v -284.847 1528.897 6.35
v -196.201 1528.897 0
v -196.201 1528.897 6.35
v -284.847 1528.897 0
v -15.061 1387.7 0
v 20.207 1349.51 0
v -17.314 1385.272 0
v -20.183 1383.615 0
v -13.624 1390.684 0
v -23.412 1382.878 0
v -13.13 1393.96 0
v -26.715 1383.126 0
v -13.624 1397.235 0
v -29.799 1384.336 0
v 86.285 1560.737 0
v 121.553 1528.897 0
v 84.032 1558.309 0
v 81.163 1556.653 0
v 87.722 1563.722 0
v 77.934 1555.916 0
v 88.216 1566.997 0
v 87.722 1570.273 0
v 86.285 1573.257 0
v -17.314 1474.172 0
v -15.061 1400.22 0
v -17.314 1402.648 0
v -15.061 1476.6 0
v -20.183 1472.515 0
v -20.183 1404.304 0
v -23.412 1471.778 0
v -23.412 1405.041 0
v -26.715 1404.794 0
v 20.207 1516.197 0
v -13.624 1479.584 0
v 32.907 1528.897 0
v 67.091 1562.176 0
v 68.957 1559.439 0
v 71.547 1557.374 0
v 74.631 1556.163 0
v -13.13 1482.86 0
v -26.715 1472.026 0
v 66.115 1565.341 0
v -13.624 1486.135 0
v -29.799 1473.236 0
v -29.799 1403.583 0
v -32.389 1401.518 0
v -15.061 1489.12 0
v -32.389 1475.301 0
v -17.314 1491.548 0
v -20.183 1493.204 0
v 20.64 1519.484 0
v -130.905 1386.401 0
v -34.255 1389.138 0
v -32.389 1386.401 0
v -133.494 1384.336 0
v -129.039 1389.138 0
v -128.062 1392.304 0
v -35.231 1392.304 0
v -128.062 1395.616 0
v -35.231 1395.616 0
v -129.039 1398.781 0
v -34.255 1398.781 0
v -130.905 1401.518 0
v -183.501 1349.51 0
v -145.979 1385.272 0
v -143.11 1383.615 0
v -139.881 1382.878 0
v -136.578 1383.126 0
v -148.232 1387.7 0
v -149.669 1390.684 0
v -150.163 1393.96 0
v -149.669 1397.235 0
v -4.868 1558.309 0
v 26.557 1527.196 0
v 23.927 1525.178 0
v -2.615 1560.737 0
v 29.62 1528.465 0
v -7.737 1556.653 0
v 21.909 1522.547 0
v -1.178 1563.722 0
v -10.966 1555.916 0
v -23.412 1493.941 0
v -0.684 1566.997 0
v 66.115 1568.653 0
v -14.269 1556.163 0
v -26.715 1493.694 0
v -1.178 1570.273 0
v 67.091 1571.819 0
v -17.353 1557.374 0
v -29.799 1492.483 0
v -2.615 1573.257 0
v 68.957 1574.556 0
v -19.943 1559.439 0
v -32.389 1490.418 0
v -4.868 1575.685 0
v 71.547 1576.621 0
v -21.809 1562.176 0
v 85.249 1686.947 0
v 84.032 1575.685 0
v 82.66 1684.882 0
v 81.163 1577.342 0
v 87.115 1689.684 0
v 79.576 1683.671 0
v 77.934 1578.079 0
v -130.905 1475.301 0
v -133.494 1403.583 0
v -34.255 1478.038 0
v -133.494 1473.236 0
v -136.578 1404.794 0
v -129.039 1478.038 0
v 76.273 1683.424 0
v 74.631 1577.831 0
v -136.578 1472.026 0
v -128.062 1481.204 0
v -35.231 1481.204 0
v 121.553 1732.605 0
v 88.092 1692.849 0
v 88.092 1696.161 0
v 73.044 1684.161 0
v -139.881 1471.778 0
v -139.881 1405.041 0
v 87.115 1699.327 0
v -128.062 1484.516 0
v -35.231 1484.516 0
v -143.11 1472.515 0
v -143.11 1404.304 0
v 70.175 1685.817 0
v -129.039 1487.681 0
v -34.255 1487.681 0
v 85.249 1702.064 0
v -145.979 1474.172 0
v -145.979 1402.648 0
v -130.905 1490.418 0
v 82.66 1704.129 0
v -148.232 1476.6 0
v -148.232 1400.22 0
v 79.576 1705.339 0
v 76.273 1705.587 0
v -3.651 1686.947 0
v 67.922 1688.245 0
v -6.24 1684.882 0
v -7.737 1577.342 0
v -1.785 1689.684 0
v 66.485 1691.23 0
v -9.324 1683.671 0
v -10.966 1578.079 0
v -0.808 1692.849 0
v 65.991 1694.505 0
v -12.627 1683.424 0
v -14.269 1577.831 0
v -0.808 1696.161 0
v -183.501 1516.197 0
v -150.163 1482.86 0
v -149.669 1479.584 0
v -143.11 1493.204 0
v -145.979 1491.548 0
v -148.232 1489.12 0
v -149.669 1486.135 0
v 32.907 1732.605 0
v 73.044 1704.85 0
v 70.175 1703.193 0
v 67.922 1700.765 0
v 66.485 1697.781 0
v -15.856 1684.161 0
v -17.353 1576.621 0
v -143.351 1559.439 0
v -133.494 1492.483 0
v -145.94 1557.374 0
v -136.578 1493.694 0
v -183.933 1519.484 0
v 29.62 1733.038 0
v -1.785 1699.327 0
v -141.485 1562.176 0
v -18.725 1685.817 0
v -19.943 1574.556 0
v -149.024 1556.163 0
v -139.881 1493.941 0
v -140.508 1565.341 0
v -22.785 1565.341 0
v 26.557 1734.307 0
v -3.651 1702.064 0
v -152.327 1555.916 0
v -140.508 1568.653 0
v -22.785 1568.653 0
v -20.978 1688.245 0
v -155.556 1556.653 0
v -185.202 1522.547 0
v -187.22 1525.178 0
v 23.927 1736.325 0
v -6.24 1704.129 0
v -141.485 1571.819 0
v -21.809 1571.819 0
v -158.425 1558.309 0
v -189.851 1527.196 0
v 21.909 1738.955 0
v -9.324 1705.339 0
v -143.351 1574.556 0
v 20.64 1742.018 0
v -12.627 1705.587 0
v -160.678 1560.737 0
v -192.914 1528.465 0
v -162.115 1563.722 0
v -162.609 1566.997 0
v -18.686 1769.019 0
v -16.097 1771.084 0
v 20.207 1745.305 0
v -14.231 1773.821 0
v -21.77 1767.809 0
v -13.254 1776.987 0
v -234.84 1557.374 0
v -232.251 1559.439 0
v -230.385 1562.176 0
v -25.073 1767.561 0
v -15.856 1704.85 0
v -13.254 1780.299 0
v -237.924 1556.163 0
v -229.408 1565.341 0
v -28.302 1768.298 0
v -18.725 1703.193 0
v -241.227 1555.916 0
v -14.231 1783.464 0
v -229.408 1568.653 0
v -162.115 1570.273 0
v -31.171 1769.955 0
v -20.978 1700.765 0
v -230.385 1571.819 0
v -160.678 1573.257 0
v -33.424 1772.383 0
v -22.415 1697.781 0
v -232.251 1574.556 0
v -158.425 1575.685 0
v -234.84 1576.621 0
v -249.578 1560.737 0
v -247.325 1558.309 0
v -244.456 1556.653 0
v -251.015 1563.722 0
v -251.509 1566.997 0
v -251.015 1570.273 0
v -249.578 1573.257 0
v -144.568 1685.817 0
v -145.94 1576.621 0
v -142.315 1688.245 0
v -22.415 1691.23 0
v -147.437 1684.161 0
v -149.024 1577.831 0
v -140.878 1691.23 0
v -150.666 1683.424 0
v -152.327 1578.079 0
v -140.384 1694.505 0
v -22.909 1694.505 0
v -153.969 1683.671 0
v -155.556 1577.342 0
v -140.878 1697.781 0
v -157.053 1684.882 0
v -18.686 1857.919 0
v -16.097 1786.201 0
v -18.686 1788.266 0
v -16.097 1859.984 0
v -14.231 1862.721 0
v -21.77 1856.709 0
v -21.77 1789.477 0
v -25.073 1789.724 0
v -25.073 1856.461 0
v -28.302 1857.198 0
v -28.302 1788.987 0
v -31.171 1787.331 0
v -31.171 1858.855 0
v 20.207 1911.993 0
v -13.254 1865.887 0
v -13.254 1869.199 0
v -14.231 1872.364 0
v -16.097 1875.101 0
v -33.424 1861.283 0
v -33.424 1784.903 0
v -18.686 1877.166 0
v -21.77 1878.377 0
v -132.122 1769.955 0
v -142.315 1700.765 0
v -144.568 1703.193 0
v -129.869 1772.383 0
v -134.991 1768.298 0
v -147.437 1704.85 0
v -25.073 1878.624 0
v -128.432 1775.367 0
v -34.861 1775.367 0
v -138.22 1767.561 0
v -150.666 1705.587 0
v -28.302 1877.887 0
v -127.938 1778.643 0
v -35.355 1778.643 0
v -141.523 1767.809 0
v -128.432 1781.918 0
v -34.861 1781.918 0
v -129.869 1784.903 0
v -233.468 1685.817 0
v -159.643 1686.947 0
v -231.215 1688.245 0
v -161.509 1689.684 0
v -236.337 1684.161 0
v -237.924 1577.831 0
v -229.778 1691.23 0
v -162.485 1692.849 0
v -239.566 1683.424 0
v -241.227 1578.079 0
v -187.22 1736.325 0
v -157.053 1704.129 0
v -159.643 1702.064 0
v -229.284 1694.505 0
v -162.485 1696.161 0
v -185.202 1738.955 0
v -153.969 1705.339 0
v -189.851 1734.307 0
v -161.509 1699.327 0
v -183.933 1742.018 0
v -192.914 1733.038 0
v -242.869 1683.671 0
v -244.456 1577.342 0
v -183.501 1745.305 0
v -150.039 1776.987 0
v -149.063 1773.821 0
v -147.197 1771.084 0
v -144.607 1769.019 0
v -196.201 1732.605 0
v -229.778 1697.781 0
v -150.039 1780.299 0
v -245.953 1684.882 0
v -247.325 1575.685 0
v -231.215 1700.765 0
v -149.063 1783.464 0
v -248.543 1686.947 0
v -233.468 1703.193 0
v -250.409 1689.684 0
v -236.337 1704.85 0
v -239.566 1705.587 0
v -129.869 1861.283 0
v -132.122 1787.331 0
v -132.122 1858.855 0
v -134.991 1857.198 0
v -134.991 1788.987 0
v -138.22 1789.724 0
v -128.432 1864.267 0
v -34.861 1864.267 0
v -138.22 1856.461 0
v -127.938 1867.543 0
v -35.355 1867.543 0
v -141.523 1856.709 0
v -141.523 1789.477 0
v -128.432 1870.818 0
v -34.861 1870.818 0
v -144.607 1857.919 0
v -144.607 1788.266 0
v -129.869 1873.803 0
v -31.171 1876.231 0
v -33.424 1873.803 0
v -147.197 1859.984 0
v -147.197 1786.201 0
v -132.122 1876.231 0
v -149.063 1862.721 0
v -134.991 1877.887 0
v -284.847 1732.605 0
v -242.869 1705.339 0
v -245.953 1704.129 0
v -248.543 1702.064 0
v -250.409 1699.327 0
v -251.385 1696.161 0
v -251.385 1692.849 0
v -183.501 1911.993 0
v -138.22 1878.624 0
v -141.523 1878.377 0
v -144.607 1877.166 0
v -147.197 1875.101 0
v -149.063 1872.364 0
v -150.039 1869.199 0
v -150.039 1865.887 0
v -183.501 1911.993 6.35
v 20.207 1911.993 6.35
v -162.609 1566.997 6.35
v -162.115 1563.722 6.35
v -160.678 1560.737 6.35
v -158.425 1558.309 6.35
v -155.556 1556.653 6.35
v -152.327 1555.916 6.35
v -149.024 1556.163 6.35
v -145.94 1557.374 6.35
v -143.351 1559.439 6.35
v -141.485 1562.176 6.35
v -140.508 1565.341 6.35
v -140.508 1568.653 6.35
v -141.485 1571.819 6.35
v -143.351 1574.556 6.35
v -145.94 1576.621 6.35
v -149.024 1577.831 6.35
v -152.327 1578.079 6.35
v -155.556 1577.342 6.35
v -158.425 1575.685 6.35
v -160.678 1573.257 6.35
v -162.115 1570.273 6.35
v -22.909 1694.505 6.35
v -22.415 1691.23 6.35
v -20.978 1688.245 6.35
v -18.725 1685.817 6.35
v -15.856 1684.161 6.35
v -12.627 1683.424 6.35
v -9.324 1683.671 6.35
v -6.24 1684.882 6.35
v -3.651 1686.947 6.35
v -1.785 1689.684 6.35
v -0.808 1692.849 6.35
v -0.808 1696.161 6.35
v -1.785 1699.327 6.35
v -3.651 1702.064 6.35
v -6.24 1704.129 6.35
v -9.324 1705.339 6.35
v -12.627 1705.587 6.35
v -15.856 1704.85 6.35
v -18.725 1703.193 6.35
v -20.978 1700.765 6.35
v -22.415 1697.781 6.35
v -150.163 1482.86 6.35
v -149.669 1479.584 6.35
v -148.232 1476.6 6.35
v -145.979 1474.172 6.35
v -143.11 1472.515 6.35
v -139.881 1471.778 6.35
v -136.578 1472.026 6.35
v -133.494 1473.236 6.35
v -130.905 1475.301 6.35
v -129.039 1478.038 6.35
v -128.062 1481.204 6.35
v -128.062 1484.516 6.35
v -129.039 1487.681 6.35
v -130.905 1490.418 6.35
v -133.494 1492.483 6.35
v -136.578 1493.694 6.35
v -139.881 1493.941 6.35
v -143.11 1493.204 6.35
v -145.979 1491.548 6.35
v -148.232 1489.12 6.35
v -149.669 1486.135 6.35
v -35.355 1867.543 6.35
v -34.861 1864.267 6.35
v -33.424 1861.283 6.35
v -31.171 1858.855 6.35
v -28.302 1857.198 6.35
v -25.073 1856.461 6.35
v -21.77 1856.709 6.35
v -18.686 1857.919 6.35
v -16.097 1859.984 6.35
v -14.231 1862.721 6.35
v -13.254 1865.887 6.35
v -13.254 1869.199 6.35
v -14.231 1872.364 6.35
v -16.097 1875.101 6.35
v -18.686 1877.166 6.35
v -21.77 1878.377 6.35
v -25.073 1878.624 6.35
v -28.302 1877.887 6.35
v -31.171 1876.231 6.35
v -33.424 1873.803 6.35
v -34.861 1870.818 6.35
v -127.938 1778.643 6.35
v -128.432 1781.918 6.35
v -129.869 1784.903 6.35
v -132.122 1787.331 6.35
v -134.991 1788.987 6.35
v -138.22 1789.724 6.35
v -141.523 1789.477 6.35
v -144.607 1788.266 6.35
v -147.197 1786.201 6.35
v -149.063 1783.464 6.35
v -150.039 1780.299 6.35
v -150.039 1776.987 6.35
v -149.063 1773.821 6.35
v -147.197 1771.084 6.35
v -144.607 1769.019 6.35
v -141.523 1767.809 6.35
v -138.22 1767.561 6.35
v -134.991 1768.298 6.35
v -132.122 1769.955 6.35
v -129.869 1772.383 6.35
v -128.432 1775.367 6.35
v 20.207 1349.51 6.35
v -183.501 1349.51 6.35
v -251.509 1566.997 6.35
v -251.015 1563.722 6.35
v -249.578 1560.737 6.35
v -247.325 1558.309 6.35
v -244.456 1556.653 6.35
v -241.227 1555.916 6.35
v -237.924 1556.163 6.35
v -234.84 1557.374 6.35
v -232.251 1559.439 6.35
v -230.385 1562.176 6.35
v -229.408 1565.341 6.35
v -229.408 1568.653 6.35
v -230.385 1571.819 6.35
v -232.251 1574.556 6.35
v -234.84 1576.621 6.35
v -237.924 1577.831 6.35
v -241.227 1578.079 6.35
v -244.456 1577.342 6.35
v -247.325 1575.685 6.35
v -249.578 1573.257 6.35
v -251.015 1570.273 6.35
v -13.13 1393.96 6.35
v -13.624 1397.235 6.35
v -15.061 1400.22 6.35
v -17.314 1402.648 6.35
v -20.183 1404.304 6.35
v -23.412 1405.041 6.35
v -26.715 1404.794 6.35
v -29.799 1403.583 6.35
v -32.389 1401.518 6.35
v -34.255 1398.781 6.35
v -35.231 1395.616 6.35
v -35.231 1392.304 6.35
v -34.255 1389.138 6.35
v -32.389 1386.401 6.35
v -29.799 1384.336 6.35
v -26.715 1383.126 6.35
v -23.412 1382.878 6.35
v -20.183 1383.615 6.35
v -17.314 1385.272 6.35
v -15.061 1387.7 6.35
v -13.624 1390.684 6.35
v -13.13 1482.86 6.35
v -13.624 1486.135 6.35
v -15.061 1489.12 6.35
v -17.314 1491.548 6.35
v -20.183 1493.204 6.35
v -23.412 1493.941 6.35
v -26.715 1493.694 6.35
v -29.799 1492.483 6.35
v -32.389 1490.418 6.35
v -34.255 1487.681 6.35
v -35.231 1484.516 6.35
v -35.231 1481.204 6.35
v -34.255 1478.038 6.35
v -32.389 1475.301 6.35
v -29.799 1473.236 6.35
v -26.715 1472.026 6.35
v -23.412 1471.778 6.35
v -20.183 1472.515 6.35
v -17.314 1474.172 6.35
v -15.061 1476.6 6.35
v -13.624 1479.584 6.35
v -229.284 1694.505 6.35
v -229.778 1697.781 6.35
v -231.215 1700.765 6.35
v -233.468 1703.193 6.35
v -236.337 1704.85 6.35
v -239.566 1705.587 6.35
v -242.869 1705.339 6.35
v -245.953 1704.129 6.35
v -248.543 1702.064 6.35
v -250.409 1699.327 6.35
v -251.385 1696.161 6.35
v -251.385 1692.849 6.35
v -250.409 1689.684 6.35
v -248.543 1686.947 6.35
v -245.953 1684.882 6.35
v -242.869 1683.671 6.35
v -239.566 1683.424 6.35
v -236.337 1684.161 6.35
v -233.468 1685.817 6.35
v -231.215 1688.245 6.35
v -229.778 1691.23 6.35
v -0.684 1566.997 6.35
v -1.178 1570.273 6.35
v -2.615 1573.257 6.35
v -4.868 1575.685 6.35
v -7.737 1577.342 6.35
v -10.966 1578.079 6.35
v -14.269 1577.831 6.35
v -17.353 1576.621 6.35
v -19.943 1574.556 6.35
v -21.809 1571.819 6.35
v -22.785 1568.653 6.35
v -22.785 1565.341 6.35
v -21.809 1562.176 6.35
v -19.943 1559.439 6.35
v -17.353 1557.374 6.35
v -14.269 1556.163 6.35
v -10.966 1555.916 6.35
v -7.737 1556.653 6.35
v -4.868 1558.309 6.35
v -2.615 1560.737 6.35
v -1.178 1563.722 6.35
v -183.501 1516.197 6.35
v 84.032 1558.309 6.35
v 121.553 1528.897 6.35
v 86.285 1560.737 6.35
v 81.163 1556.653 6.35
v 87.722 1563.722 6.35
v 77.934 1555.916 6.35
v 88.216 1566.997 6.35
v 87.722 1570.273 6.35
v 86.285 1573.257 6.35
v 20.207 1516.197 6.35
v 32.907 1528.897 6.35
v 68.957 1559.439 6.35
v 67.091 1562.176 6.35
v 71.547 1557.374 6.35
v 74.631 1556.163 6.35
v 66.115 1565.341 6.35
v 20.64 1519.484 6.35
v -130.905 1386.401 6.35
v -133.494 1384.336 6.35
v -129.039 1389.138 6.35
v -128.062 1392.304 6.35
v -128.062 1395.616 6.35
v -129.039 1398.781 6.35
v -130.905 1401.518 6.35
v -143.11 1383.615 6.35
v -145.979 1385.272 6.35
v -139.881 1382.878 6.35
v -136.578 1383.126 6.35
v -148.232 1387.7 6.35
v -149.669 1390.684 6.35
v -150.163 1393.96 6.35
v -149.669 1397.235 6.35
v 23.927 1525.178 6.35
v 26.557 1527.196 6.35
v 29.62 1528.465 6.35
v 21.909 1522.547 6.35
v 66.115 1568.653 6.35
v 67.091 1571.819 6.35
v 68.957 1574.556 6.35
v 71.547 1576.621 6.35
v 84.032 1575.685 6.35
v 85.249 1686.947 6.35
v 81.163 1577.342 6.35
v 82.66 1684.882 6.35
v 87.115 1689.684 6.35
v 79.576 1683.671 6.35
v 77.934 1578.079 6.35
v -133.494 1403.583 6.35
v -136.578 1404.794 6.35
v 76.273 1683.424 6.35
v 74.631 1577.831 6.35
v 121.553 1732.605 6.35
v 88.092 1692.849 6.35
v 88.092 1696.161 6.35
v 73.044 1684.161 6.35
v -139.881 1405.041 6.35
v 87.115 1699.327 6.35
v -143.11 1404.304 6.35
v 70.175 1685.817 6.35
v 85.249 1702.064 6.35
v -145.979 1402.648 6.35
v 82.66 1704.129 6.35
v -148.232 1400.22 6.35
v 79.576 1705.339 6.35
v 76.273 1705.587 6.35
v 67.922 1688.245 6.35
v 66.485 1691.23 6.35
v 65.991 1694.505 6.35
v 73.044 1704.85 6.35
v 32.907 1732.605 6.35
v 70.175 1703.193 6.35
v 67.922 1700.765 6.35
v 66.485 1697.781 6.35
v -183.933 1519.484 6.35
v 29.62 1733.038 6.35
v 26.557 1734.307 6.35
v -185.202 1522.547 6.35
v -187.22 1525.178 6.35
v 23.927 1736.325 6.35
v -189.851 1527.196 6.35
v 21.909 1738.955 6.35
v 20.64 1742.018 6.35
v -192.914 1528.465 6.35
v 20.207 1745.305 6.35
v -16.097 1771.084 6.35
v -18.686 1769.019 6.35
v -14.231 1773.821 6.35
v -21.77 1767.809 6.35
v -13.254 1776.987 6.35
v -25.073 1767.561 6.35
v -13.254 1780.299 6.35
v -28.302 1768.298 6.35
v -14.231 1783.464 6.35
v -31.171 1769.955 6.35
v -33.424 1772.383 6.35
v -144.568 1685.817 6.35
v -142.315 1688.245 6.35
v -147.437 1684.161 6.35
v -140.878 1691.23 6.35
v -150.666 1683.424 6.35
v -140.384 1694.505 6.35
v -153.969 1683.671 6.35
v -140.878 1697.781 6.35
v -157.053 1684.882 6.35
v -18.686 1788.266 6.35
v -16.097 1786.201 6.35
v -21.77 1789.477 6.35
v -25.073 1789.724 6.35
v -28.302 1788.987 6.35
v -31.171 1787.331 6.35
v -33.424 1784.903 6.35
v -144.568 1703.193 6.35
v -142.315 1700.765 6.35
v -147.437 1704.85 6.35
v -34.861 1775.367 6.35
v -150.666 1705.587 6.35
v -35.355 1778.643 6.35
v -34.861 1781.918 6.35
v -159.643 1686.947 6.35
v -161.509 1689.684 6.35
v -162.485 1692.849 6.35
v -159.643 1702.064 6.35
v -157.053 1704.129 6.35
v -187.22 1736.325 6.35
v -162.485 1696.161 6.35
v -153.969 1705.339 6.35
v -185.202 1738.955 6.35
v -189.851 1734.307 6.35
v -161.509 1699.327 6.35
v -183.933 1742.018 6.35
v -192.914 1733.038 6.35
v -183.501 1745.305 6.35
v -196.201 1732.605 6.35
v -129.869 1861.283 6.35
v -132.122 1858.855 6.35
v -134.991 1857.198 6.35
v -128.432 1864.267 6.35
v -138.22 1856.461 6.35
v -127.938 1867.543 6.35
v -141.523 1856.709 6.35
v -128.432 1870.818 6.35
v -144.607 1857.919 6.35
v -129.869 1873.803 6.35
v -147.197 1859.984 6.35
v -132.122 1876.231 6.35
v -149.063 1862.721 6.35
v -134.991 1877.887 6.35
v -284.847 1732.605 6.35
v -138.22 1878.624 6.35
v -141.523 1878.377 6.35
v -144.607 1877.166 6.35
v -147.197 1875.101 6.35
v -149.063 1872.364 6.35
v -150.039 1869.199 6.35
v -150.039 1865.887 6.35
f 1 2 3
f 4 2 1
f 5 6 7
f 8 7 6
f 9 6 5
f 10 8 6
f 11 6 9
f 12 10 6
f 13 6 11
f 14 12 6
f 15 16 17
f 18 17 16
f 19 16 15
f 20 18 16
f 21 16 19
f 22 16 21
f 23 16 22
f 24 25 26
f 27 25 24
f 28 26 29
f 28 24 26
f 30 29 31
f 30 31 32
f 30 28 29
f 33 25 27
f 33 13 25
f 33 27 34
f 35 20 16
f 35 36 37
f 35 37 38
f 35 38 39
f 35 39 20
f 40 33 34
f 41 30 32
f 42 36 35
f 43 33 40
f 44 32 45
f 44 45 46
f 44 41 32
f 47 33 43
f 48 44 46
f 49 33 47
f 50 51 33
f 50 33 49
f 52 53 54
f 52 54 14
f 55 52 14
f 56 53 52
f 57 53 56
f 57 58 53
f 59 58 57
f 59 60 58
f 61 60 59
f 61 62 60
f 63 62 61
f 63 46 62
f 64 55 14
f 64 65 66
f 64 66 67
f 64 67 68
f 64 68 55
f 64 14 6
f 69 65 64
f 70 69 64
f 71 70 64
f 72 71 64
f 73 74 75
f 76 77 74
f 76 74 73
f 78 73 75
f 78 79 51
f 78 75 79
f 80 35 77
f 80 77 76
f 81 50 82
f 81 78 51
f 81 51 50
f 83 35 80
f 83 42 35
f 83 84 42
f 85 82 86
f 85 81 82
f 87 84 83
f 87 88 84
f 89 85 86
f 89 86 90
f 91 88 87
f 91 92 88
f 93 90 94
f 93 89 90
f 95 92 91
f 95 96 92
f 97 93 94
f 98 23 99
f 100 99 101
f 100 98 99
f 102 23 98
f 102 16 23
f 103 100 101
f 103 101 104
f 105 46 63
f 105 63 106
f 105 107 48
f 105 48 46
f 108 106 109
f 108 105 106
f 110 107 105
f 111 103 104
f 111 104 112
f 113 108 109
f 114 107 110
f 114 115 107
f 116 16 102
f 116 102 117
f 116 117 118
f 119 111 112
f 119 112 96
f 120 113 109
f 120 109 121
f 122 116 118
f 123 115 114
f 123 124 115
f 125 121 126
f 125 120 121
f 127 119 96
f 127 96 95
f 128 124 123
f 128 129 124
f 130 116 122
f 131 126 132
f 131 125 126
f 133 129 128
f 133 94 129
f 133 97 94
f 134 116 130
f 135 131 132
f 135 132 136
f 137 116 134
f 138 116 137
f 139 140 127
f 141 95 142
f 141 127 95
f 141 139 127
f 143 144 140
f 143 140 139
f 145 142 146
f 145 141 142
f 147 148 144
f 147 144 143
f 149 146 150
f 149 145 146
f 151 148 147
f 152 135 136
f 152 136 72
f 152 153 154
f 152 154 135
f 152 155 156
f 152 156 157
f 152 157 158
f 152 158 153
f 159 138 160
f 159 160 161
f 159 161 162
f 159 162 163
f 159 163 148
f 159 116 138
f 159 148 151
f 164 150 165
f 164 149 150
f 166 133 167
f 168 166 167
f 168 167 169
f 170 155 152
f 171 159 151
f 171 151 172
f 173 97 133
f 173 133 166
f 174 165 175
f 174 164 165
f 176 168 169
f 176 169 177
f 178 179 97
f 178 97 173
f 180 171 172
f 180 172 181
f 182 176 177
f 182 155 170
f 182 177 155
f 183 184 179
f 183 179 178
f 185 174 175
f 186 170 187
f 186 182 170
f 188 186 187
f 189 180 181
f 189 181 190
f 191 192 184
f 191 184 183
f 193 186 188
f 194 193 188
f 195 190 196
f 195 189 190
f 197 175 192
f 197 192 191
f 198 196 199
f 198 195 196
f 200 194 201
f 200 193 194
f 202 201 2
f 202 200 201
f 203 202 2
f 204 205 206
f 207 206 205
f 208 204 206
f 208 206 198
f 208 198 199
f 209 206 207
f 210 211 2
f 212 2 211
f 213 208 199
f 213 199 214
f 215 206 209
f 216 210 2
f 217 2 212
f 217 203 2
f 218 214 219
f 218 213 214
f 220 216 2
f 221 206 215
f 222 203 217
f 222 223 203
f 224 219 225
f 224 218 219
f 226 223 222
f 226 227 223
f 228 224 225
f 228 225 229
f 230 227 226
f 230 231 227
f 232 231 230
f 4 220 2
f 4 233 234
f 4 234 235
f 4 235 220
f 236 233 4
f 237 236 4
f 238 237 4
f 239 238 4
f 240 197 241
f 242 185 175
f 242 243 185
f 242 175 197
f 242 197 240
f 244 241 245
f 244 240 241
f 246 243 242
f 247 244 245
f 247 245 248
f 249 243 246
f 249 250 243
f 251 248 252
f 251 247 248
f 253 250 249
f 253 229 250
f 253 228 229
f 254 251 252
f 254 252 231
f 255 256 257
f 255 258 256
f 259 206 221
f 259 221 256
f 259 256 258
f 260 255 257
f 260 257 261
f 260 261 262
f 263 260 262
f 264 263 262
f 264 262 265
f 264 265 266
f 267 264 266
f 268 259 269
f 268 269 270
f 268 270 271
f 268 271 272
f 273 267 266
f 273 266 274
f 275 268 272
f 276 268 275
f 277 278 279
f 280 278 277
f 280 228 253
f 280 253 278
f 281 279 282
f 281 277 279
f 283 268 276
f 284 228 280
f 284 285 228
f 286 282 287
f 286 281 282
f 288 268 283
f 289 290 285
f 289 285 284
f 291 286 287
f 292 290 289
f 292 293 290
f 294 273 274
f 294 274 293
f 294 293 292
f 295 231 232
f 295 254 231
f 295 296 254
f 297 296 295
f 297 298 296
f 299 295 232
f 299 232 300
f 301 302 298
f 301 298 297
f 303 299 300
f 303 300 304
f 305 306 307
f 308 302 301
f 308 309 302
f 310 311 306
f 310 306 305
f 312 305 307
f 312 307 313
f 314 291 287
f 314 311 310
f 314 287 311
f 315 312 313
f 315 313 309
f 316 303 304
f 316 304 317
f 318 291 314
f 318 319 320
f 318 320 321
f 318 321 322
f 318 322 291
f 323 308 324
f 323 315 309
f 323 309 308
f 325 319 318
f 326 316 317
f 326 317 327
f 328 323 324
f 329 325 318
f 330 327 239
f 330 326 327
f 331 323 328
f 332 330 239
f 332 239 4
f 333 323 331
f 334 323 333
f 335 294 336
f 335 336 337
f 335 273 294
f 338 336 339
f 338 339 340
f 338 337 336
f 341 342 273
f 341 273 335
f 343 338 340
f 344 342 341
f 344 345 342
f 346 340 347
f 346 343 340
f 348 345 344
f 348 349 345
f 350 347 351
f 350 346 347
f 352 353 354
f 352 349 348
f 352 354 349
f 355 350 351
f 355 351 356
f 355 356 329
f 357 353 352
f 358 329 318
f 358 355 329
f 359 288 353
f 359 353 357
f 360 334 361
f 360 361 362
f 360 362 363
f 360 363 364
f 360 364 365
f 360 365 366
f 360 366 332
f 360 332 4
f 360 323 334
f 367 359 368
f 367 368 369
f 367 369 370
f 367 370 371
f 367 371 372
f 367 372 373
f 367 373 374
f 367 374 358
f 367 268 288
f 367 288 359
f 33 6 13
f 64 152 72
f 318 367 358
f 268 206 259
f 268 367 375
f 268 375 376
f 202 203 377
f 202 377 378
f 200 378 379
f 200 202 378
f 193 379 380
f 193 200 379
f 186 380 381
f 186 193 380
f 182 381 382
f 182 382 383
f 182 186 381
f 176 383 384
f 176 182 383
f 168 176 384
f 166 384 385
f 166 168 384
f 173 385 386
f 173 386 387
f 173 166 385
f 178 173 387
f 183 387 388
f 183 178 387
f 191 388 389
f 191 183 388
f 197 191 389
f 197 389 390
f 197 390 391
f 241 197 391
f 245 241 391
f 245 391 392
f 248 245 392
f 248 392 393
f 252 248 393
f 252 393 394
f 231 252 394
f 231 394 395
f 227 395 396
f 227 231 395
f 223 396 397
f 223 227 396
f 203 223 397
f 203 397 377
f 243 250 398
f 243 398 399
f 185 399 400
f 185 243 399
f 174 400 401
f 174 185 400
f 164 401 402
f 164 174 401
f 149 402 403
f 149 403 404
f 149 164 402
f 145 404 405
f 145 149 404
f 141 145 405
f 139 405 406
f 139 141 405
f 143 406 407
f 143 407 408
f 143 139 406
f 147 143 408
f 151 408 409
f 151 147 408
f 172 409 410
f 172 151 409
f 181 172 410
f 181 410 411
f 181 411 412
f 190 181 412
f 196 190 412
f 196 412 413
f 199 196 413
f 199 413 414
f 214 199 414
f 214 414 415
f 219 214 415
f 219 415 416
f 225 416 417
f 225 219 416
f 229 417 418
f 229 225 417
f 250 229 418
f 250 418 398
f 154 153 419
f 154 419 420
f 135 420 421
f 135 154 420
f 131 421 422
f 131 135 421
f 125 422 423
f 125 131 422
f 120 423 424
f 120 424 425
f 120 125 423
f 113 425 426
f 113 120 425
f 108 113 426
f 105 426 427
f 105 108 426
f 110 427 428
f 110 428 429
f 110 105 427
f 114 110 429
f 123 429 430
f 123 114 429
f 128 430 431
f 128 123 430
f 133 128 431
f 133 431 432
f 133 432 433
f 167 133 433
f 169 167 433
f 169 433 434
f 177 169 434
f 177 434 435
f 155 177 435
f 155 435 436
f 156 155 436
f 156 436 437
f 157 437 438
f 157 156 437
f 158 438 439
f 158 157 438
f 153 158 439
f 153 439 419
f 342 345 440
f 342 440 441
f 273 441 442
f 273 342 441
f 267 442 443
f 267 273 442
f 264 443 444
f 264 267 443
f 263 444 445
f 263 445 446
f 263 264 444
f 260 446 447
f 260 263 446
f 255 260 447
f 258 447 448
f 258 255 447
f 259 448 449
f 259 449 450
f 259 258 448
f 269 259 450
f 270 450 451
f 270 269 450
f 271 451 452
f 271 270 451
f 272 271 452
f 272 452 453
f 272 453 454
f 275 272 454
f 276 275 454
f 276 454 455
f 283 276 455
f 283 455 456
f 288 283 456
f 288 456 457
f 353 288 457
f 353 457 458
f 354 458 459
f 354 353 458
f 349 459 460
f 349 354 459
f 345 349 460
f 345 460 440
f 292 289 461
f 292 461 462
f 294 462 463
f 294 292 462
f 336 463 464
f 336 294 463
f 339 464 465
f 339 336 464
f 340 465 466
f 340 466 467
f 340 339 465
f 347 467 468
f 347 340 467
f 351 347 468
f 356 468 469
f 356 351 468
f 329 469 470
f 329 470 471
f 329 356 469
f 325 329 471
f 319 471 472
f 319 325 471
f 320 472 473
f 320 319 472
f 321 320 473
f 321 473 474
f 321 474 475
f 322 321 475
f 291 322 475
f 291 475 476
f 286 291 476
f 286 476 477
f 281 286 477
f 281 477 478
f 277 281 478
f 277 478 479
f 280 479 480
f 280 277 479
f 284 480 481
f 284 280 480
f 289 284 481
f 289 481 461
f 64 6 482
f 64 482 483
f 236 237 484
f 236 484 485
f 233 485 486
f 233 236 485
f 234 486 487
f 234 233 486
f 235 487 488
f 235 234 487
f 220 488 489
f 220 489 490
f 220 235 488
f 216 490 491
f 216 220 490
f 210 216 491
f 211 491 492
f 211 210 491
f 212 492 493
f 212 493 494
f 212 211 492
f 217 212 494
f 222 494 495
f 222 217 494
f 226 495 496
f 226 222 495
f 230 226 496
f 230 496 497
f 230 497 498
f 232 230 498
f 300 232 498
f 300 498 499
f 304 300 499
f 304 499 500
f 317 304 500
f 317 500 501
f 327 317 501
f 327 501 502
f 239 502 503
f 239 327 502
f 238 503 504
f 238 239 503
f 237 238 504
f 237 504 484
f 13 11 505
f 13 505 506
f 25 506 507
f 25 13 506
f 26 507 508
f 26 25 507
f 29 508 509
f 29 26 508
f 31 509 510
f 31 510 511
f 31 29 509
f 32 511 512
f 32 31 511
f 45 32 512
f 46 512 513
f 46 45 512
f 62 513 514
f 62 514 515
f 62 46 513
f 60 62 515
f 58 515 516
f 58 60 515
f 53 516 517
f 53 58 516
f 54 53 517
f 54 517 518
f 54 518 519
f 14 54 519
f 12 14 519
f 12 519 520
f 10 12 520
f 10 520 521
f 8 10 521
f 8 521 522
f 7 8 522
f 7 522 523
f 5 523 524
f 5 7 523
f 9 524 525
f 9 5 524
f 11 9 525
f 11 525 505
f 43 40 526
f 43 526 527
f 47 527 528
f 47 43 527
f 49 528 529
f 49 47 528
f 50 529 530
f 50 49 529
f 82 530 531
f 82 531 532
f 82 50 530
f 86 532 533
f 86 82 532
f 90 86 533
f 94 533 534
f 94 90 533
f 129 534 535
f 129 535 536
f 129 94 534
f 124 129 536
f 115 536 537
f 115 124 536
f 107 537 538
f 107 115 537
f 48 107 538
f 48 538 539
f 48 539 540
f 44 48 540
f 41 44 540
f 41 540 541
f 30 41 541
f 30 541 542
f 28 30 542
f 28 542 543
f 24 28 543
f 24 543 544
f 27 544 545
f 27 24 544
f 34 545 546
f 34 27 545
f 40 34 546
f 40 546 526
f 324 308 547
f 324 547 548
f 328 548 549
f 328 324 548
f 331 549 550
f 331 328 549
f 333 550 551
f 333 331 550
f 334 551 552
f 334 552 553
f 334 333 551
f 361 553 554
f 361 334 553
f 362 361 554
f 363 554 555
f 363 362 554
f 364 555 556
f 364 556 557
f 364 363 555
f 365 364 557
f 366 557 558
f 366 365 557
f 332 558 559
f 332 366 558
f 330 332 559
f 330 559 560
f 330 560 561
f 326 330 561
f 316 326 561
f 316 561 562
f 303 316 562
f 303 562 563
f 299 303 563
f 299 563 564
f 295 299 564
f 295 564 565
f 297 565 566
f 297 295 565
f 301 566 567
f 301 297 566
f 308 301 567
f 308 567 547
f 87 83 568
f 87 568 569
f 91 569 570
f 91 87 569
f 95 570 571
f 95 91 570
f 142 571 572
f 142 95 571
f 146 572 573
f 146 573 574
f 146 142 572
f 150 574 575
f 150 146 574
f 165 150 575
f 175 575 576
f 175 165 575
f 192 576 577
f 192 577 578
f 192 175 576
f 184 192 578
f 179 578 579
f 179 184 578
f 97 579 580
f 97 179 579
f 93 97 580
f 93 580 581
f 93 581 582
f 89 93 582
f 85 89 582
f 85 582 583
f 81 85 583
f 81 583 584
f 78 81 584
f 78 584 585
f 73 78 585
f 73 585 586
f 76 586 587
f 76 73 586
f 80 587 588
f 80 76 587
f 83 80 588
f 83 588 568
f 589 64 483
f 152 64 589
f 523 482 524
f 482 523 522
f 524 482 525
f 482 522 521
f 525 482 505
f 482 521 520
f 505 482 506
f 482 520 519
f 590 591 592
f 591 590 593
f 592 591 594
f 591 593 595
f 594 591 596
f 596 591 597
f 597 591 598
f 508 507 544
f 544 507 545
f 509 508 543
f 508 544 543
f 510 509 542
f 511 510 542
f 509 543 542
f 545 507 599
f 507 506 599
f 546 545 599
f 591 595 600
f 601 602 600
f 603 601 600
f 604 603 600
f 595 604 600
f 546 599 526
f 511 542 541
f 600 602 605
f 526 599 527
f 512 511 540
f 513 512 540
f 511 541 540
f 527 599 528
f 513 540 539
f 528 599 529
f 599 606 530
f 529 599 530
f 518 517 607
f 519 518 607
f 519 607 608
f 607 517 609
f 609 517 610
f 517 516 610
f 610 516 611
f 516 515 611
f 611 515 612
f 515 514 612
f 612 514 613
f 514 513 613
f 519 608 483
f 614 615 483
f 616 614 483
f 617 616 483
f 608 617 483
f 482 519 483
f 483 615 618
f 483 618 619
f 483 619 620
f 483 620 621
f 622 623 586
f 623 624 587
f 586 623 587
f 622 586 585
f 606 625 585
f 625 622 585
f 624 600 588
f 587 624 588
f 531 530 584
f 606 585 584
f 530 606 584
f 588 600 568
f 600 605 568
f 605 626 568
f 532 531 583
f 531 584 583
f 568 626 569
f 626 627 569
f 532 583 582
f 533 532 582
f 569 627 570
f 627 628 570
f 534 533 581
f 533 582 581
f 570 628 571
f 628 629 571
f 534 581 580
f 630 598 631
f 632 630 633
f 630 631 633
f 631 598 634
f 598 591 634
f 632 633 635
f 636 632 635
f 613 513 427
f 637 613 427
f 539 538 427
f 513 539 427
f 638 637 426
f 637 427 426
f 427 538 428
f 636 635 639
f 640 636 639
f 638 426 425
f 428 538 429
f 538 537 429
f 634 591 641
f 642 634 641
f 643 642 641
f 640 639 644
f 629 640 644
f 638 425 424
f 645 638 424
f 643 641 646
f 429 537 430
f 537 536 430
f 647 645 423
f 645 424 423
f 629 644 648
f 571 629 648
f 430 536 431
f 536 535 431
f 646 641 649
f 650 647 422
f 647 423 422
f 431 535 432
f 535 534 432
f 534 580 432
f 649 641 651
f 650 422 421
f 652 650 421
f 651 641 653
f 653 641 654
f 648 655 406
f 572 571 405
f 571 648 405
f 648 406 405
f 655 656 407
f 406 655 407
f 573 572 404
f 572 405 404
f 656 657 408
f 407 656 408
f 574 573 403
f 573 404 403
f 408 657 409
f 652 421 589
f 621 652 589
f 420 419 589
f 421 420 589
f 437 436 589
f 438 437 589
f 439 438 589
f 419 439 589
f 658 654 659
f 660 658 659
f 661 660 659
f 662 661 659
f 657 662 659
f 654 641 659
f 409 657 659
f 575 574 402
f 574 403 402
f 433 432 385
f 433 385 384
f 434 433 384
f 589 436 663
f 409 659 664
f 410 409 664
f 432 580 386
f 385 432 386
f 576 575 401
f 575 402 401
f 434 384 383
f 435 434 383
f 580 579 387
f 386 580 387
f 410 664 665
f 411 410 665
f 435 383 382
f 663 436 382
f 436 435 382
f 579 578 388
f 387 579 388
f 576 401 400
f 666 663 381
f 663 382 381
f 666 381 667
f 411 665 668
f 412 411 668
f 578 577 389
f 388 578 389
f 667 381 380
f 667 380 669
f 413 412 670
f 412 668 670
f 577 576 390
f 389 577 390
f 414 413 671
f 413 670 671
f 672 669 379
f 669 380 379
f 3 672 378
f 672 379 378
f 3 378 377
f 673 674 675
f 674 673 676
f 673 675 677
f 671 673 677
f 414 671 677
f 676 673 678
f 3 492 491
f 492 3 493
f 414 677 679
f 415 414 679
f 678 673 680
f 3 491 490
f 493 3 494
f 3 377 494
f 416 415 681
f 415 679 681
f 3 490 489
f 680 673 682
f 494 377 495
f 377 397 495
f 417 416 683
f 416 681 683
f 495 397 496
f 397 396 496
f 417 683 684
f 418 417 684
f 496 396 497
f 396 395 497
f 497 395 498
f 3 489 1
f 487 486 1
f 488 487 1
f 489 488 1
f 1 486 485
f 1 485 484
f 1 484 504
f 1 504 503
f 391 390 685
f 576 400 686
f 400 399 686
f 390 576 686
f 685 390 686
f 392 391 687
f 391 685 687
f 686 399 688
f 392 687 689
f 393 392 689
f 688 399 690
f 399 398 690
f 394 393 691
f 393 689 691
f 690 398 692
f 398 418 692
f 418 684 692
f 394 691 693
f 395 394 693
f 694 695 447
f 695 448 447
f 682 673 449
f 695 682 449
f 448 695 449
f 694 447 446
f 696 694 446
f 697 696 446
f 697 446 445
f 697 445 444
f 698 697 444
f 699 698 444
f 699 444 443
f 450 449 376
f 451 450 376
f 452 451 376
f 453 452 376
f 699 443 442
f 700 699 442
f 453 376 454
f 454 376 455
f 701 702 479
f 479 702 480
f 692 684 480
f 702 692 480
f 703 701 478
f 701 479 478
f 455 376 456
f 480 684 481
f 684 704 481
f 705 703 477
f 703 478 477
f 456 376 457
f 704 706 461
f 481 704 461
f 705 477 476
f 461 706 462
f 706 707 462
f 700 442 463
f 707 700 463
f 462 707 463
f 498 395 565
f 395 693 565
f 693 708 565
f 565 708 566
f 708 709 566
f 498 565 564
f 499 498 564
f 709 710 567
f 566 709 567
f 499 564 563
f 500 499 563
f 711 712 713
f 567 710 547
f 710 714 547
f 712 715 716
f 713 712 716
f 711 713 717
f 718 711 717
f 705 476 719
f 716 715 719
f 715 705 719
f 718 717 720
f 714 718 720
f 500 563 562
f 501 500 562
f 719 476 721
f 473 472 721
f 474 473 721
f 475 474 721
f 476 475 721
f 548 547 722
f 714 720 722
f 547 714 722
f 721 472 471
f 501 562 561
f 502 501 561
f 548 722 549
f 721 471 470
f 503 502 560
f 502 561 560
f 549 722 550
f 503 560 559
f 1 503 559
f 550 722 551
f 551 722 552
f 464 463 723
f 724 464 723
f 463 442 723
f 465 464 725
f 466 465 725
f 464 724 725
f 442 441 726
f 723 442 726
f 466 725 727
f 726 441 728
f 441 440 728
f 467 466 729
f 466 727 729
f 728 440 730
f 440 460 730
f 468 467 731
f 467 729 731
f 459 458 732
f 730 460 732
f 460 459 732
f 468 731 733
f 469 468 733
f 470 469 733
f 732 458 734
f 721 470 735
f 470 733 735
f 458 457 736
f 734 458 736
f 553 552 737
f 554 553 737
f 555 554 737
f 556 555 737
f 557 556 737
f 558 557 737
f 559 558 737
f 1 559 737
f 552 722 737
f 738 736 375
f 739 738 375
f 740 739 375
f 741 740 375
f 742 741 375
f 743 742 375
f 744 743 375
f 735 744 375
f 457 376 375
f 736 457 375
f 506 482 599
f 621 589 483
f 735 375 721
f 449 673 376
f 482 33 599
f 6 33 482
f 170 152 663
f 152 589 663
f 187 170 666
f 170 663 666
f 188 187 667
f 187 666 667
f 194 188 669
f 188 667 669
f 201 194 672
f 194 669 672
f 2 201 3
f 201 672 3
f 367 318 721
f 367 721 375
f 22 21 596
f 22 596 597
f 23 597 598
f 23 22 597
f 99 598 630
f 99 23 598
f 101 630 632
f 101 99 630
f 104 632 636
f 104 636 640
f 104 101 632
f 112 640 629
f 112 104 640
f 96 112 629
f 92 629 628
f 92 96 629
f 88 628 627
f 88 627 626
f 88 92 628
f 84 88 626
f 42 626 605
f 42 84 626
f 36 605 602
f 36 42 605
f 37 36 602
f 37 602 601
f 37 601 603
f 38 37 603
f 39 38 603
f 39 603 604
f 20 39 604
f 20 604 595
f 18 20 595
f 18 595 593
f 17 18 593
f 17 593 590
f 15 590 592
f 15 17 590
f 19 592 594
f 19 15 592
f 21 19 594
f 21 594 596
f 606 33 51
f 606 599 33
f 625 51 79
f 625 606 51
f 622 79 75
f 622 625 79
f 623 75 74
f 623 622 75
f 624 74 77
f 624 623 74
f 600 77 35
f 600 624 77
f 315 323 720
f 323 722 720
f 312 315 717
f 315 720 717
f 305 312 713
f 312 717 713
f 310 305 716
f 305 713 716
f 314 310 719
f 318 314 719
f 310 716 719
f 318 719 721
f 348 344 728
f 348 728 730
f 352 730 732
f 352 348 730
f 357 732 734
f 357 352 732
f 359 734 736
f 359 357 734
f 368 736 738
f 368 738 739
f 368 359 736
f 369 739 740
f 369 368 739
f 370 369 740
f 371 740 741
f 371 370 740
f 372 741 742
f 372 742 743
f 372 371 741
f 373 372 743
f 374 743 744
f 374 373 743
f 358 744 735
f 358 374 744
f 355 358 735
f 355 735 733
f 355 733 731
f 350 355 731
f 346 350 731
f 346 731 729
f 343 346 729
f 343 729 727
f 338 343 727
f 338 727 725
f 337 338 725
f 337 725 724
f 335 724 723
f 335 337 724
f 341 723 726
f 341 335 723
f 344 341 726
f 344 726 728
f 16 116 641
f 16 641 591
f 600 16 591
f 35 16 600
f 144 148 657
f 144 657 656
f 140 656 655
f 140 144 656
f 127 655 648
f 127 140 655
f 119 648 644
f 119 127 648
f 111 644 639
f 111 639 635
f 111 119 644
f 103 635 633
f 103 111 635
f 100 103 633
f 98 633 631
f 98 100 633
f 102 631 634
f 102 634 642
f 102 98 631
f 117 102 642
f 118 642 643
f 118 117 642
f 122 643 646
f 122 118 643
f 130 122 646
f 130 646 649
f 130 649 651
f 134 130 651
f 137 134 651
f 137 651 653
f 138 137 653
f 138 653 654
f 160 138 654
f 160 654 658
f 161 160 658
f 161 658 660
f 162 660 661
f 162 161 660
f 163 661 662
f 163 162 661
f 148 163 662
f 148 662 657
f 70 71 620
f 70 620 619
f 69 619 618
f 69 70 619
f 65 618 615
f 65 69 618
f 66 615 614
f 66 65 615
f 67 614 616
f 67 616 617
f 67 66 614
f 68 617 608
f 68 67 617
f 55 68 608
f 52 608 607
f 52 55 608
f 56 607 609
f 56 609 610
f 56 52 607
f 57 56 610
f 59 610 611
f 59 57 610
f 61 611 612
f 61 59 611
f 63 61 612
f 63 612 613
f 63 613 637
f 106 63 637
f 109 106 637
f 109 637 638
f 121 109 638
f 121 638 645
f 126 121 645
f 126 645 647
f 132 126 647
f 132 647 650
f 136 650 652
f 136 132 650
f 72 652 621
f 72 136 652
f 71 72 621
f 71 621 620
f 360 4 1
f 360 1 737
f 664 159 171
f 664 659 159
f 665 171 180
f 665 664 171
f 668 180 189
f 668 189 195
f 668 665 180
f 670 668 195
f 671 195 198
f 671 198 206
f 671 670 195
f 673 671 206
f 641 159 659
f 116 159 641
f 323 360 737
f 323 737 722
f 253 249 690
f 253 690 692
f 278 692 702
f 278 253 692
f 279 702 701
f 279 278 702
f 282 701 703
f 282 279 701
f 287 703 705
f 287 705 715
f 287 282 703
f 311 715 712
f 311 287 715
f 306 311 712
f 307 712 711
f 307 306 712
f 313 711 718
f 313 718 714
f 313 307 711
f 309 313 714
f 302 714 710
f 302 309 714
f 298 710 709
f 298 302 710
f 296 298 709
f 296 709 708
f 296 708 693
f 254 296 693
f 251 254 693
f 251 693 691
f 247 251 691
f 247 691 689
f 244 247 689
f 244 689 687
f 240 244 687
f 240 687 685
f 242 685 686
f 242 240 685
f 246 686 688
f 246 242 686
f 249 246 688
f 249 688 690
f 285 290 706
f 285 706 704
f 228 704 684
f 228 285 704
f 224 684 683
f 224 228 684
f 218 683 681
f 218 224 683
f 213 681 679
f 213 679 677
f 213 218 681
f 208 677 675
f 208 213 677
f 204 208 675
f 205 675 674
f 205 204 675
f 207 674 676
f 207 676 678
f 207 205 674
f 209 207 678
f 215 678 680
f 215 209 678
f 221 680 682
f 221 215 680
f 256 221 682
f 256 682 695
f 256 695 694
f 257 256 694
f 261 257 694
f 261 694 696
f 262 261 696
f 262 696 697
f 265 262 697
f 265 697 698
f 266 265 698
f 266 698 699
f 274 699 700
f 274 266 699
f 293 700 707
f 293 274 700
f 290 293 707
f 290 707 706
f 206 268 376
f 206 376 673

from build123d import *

# Parameters (mm, degrees)
SKETCH1_R           = 11.1125
BOSS_EXTRUDE1_DEPTH = 6.35
FILLET1_R           = 12.7


with BuildPart() as part:
    # Sketch1 → Boss-Extrude1 (new body)
    with BuildSketch(Plane.XY):
        Polygon((20.207363698, 1349.509753019), (-183.500636302, 1349.509753019), (-183.500636302, 1528.897253019), (-284.846636302, 1528.897253019), (-284.846636302, 1732.605253019), (-183.500636302, 1732.605253019), (-183.500636302, 1911.992753019), (20.207363698, 1911.992753019), (20.207363698, 1732.605253019), (121.553363698, 1732.605253019), (121.553363698, 1528.897253019), (20.207363698, 1528.897253019), align=None)
        with Locations((-139.050636302, 1867.542753019)):
            Circle(SKETCH1_R, mode=Mode.SUBTRACT)
        with Locations((-151.496636302, 1694.505253019)):
            Circle(SKETCH1_R, mode=Mode.SUBTRACT)
        with Locations(Location((-11.796636302, 1694.505253019, 0), (0, 0, 180))):
            Circle(SKETCH1_R, mode=Mode.SUBTRACT)
        with Locations(Location((-24.242636302, 1867.542753019, 0), (0, 0, 180))):
            Circle(SKETCH1_R, mode=Mode.SUBTRACT)
        with Locations((-24.242636302, 1393.959753019)):
            Circle(SKETCH1_R, mode=Mode.SUBTRACT)
        with Locations(Location((-139.050636302, 1393.959753019, 0), (0, 0, 180))):
            Circle(SKETCH1_R, mode=Mode.SUBTRACT)
        with Locations(Location((-151.496636302, 1566.997253019, 0), (0, 0, 180))):
            Circle(SKETCH1_R, mode=Mode.SUBTRACT)
        with Locations((-11.796636302, 1566.997253019)):
            Circle(SKETCH1_R, mode=Mode.SUBTRACT)
        with Locations((-240.396636302, 1694.505253019)):
            Circle(SKETCH1_R, mode=Mode.SUBTRACT)
        with Locations((-139.050636302, 1778.642753019)):
            Circle(SKETCH1_R, mode=Mode.SUBTRACT)
        with Locations(Location((-139.050636302, 1482.859753019, 0), (0, 0, 180))):
            Circle(SKETCH1_R, mode=Mode.SUBTRACT)
        with Locations(Location((-240.396636302, 1566.997253019, 0), (0, 0, 180))):
            Circle(SKETCH1_R, mode=Mode.SUBTRACT)
        with Locations(Location((-24.242636302, 1778.642753019, 0), (0, 0, 180))):
            Circle(SKETCH1_R, mode=Mode.SUBTRACT)
        with Locations(Location((77.103363698, 1694.505253019, 0), (0, 0, 180))):
            Circle(SKETCH1_R, mode=Mode.SUBTRACT)
        with Locations((77.103363698, 1566.997253019)):
            Circle(SKETCH1_R, mode=Mode.SUBTRACT)
        with Locations((-24.242636302, 1482.859753019)):
            Circle(SKETCH1_R, mode=Mode.SUBTRACT)
    extrude(amount=BOSS_EXTRUDE1_DEPTH)

    # Fillet1
    fillet1_edges = [part.edges().sort_by_distance(p)[0] for p in [
        (-183.500636302, 1528.897253019, 3.175),
        (-183.500636302, 1732.605253019, 3.175),
        (20.207363698, 1732.605253019, 3.175),
        (20.207363698, 1528.897253019, 3.175),
    ]]
    fillet(fillet1_edges, radius=FILLET1_R)


solid = part.part
